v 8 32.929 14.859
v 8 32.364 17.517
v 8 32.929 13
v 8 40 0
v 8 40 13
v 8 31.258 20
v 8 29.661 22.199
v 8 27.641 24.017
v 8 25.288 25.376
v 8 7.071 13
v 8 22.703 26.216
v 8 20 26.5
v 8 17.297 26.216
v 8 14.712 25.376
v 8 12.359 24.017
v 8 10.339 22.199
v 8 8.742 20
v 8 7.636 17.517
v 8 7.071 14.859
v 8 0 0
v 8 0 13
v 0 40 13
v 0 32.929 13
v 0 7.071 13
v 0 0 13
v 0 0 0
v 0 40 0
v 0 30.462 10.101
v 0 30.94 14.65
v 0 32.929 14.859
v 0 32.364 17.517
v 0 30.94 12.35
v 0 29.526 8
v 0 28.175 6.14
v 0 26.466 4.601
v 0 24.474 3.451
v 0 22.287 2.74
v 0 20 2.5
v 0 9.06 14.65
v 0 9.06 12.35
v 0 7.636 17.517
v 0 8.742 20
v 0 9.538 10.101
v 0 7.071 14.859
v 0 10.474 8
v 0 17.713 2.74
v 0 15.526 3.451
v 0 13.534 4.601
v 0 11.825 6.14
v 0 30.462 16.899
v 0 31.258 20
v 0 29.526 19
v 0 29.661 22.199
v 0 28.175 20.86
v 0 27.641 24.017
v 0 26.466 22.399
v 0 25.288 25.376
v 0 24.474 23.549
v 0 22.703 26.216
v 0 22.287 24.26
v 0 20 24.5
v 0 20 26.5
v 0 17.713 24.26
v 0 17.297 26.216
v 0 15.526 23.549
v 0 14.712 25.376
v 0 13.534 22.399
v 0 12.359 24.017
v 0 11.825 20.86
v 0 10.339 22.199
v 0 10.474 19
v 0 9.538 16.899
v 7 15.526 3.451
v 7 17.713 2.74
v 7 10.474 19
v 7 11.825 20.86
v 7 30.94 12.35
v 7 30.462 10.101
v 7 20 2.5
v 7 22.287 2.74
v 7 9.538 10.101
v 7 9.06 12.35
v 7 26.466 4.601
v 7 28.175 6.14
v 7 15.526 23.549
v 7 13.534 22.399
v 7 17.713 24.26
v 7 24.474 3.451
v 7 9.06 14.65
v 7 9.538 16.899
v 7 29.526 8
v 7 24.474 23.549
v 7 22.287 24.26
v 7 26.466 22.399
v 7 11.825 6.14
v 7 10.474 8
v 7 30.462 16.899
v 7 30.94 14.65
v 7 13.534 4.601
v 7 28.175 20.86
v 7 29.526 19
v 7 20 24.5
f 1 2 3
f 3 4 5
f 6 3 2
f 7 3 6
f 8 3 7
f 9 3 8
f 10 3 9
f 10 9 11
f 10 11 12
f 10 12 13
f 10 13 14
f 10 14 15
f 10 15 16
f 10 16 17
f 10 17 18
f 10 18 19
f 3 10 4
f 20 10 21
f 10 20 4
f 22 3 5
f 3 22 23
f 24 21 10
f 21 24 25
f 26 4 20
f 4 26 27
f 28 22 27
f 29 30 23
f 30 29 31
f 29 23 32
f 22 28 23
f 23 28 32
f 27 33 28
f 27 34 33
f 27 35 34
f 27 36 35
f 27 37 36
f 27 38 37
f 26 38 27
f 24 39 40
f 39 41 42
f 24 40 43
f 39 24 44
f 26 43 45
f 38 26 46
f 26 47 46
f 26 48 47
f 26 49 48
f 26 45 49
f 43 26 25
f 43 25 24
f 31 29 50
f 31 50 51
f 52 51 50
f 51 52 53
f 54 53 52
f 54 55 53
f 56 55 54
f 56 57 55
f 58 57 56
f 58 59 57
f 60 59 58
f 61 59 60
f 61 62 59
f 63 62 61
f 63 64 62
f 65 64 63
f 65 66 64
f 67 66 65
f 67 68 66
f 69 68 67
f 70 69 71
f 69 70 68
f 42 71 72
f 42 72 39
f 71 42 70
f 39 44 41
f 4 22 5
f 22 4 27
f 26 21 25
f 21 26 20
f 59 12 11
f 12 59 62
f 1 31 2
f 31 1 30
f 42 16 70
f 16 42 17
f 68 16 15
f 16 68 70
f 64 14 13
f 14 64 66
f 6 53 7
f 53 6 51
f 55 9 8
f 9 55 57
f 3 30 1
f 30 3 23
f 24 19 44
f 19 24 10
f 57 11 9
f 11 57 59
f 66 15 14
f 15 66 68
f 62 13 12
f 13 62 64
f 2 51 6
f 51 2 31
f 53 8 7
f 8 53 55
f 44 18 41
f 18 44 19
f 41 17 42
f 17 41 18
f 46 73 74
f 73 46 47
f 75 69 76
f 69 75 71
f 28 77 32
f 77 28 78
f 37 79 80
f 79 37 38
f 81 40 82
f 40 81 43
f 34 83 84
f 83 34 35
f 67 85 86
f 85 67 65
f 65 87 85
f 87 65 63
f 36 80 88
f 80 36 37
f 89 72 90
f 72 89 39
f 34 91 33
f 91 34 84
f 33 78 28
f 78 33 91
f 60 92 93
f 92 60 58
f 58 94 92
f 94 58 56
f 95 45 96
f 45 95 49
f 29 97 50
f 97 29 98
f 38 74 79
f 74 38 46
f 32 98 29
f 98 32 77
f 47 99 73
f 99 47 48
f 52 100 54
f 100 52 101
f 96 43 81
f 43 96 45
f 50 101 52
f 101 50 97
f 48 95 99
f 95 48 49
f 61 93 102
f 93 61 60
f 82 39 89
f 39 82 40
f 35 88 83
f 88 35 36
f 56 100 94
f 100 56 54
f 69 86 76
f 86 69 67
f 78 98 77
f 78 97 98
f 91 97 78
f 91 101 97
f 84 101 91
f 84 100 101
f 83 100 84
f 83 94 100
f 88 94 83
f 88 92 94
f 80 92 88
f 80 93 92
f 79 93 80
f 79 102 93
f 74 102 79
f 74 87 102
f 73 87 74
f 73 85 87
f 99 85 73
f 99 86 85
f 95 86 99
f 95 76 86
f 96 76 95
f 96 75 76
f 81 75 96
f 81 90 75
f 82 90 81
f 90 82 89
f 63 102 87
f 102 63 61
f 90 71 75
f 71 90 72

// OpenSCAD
module bearing_block() {
	difference() {
		union() {
			cube([8,40,26/2]);
			translate([0,20,23/2+2]) rotate([0,90,0]) cylinder(r=26/2, h=8);
		}
		translate([-0.5,20,23/2+2]) rotate([0,90,0]) cylinder(r=22/2, h=7.5);
	}
}

bearing_block();
